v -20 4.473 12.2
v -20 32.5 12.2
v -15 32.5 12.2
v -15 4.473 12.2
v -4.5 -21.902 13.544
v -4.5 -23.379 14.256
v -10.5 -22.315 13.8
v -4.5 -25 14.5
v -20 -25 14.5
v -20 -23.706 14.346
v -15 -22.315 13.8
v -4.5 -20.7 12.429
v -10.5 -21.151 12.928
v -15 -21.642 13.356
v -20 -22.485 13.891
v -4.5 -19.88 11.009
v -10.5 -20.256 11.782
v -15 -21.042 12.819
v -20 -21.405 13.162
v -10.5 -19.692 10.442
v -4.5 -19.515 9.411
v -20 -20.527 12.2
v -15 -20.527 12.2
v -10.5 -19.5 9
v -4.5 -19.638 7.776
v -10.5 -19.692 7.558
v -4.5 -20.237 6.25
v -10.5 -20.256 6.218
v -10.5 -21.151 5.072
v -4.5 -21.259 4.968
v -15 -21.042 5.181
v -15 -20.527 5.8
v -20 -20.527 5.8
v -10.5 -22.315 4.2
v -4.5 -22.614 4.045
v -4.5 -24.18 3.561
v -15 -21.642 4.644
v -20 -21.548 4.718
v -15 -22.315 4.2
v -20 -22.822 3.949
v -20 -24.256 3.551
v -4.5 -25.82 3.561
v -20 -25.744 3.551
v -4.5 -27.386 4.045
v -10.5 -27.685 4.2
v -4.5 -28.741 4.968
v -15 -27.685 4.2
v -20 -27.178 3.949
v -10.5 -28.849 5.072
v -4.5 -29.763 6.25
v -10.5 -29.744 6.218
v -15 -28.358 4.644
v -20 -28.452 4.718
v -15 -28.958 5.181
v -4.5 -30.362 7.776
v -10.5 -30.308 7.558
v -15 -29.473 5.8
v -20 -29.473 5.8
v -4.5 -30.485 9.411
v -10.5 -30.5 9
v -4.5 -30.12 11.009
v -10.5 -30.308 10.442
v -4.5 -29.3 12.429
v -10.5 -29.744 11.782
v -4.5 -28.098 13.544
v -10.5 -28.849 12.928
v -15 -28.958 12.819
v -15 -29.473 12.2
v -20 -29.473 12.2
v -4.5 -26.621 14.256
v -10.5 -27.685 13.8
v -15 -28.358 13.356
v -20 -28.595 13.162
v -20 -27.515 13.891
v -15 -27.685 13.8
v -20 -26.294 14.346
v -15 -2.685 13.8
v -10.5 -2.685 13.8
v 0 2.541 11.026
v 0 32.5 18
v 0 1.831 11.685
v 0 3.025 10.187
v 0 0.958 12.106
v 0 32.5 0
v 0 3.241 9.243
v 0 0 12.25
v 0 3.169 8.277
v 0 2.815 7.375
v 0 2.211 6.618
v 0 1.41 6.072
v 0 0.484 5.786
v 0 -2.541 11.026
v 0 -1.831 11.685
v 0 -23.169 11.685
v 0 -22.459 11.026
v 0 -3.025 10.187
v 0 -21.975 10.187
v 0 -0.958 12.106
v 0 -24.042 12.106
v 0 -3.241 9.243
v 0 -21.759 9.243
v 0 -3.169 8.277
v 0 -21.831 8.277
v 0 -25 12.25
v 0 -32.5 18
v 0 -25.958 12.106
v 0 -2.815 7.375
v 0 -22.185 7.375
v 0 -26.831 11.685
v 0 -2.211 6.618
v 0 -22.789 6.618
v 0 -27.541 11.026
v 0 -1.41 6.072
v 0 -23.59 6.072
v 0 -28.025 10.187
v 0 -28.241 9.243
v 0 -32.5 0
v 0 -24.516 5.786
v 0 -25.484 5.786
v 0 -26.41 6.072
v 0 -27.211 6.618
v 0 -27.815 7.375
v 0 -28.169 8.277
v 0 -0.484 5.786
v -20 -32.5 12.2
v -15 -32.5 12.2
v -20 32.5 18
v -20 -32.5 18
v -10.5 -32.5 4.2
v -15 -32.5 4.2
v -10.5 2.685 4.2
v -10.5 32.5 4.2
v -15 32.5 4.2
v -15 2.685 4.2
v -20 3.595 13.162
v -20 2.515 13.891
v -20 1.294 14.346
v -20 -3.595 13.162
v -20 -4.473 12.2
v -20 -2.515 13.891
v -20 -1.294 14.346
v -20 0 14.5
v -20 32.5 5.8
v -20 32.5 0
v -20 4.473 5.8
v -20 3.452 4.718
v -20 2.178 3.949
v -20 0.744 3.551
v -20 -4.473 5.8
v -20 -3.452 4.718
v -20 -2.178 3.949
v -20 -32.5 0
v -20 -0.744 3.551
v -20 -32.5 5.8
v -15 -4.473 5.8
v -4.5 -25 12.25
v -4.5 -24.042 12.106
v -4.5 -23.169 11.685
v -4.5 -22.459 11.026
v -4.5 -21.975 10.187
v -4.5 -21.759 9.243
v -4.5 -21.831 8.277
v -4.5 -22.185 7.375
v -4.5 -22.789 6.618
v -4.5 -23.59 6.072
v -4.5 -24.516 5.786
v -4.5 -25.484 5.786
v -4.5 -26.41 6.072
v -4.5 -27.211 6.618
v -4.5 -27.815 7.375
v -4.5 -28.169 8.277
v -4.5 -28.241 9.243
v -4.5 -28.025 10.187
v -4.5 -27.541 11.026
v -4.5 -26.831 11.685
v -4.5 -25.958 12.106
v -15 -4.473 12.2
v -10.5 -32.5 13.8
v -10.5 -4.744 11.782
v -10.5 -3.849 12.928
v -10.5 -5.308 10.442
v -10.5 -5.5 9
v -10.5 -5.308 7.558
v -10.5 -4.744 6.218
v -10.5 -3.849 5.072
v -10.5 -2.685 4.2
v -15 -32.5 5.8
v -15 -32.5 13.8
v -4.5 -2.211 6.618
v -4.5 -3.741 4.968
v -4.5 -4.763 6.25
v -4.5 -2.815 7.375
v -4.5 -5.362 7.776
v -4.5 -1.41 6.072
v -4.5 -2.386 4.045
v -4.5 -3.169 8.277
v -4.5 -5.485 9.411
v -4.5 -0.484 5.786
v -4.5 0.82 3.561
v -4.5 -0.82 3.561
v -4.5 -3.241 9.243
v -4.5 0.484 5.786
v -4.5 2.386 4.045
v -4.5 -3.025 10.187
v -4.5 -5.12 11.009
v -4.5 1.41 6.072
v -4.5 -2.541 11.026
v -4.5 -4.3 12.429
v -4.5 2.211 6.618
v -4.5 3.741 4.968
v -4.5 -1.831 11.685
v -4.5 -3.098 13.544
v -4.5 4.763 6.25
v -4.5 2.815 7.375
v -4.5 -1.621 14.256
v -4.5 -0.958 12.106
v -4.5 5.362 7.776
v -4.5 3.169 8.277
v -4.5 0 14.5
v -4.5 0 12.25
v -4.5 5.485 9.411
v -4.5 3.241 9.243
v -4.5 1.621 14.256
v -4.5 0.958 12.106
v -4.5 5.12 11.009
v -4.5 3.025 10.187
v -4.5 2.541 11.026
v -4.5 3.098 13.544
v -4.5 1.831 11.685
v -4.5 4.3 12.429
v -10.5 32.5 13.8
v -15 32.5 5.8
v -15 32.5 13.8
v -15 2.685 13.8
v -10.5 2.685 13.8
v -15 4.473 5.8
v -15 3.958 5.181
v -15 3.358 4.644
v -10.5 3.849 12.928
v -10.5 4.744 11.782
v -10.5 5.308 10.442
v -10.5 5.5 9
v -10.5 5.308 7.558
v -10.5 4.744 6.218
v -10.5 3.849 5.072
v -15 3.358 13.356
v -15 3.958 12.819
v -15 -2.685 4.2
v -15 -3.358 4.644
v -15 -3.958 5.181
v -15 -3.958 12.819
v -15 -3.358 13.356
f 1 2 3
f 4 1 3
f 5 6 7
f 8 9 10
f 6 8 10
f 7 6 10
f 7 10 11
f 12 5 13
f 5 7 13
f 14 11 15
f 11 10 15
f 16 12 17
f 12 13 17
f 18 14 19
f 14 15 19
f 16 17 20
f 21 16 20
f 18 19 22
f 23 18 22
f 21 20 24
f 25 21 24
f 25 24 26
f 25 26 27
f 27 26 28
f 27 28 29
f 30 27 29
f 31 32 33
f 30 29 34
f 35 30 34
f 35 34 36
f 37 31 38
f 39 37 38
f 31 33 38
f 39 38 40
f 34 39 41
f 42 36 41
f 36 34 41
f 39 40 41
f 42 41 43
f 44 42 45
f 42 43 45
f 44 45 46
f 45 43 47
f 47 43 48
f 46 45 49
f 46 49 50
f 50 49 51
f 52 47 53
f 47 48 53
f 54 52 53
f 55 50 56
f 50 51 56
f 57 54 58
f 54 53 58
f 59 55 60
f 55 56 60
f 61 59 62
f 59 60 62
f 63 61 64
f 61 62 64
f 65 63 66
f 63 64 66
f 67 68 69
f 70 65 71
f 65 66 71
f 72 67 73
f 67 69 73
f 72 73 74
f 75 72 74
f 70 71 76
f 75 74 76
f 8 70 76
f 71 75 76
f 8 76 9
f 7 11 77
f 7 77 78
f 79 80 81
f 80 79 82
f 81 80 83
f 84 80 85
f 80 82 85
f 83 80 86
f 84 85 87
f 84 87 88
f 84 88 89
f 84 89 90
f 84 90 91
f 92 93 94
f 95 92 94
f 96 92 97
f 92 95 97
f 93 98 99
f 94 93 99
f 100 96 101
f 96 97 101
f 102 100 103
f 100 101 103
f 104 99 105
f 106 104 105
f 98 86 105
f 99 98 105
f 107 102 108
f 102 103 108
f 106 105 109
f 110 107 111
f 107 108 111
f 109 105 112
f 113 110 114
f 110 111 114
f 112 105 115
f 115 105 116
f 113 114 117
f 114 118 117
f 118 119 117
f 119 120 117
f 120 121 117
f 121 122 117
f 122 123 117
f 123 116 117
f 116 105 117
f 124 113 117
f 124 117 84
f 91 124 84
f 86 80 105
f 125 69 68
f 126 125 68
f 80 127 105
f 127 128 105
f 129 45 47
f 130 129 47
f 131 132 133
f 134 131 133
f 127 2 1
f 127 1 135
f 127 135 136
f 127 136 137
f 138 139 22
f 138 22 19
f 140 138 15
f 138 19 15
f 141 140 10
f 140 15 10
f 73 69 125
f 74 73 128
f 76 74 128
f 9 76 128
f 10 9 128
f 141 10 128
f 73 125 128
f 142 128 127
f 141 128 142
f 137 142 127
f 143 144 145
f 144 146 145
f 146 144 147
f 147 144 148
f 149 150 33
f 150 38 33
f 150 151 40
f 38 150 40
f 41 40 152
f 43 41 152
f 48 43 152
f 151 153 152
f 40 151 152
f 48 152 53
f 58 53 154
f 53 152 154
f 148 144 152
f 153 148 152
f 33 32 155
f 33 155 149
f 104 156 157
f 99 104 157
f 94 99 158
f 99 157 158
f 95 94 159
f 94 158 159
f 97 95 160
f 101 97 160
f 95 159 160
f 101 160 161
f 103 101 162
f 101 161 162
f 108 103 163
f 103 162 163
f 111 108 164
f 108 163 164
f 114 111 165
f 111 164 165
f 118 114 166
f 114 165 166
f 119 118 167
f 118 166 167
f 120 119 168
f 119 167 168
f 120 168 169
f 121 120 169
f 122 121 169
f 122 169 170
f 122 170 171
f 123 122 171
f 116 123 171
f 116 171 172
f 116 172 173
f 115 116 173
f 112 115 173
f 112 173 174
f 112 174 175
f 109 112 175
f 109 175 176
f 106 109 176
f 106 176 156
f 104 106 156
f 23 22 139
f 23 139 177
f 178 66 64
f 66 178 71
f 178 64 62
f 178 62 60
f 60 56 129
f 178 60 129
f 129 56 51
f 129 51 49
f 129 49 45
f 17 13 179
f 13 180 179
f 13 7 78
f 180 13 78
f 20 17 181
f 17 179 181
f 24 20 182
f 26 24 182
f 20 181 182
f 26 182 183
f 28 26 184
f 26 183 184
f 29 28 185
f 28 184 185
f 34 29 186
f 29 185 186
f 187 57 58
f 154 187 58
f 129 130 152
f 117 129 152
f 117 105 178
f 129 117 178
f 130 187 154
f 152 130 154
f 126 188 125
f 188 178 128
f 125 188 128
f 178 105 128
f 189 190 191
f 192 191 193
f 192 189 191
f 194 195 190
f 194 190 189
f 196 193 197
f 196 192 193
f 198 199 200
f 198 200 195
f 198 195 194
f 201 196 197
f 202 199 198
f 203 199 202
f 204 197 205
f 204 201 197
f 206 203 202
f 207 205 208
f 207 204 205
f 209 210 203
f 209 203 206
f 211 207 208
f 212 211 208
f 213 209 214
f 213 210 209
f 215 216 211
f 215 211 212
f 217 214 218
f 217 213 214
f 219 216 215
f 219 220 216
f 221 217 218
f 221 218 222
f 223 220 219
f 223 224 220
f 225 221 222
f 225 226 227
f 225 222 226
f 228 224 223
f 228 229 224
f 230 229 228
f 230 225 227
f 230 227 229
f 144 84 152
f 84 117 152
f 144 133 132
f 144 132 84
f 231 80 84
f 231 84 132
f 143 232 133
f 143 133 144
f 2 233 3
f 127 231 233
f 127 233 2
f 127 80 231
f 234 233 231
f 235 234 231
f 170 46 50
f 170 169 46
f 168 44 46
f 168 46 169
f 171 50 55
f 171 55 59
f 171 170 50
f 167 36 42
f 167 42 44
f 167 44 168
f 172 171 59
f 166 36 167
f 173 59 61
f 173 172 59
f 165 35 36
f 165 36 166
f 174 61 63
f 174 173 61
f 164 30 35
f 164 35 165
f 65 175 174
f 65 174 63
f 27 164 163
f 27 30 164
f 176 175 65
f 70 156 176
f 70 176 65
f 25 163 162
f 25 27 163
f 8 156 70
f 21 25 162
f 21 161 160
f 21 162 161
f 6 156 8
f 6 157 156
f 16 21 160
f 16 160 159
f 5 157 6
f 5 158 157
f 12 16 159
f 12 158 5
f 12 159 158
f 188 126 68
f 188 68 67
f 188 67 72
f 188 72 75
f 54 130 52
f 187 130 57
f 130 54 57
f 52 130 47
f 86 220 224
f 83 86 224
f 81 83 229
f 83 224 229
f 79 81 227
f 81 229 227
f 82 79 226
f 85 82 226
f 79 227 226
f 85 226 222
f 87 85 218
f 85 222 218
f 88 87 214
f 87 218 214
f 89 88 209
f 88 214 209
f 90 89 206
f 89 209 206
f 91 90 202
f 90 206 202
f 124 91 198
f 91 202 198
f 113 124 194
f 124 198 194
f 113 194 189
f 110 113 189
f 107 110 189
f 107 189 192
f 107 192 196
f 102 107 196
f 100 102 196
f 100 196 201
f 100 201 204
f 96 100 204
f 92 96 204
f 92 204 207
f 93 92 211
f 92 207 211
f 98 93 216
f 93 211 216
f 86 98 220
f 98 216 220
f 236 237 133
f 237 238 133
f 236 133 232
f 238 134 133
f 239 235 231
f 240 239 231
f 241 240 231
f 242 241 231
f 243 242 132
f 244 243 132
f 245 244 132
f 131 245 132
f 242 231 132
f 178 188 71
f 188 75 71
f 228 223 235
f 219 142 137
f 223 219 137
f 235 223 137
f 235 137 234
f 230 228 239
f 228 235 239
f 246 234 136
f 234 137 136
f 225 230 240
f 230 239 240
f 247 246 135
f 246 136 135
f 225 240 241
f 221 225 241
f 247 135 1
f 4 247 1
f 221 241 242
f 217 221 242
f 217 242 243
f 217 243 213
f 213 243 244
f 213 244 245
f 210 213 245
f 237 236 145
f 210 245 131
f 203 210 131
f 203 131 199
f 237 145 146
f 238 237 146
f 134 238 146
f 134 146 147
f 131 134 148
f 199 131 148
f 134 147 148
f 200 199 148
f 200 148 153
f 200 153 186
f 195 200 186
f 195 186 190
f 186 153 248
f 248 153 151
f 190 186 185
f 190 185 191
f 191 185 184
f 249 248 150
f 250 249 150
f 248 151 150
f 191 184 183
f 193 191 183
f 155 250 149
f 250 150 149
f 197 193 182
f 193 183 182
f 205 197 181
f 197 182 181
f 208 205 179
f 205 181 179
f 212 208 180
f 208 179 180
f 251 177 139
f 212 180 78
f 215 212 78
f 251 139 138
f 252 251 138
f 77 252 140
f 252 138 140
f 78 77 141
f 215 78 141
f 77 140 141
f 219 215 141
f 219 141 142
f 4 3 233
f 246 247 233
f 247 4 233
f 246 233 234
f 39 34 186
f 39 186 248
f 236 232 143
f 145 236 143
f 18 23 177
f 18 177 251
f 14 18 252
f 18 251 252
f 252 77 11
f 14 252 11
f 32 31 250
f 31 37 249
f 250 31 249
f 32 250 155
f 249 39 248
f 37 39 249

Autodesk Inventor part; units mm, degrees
ref_plane "YZ Plane" through (0, 0, 0) normal (1, 0, 0) x (0, 1, 0)
ref_plane "XZ Plane" through (0, 0, 0) normal (0, 1, 0) x (-1, 0, 0)
ref_plane "XY Plane" through (0, 0, 0) normal (0, 0, 1) x (1, 0, 0)
sketch "Sketch1" plane through (0, 0, 0) normal (0, 1, 0) x (-1, 0, 0)
  line L0 (0, 0) -> (20, 0)
  line L1 (20, 0) -> (20, 18)
  line L2 (20, 18) -> (0, 18)
  line L3 (0, 18) -> (0, 0)
  dimension "d0" = 18
  dimension "d1" = 20
extrude "Extrusion1" add sketch "Sketch1" along normal mid plane 65
sketch "Sketch2" plane through (-20, -32.5, 18) normal (-1, 0, 0) x (0, 0, 1)
  circle A0 centre (-9, 7.5) radius 3.25
  circle A1 centre (-9, 32.5) radius 3.25
  circle A2 centre (-9, 7.5) radius 5.5
  circle A3 centre (-9, 32.5) radius 5.5
  line L0 (0, 0) -> (-18, 0) projected
  line L1 (-18, 32.5) -> (8.866, 32.5) construction
  line L2 (-9, 65.0931) -> (-9, 0) construction
  dimension "d4" = 6.5
  dimension "d5" = 6.5
  dimension "d8" = 11
  dimension "d9" = 11
  dimension "d34" = 25
extrude "Extrusion2" cut sketch "Sketch2" against normal through all contours A0 | A1
extrude "Extrusion3" cut sketch "Sketch2" against normal blind 15.5
sketch "Sketch4" plane through (0, 32.5, 0) normal (0, 1, 0) x (1, 0, 0)
  line L0 (-20, 0) -> (-20, -18) projected
  line L1 (-20, -9) -> (2.4786, -9) construction
  line L2 (-20, -12.2) -> (-15, -12.2)
  line L3 (-15, -12.2) -> (-15, -13.8)
  line L4 (-15, -13.8) -> (-10.5, -13.8)
  line L5 (-10.5, -13.8) -> (-10.5, -4.2)
  line L6 (-10.5, -4.2) -> (-15, -4.2)
  line L7 (-15, -4.2) -> (-15, -5.8)
  line L8 (-15, -5.8) -> (-20, -5.8)
  line L9 (-20, -12.2) -> (-20, -5.8)
  point P0 (0, 0)
  dimension "d28" = 6.4
  dimension "d29" = 4.5
  dimension "d30" = 9.6
  dimension "d31" = 5
extrude "Extrusion4" cut sketch "Sketch4" against normal through all
properties part number "HeadbarHolderBracketAdjustable20mm" material "Aluminum 6061"
